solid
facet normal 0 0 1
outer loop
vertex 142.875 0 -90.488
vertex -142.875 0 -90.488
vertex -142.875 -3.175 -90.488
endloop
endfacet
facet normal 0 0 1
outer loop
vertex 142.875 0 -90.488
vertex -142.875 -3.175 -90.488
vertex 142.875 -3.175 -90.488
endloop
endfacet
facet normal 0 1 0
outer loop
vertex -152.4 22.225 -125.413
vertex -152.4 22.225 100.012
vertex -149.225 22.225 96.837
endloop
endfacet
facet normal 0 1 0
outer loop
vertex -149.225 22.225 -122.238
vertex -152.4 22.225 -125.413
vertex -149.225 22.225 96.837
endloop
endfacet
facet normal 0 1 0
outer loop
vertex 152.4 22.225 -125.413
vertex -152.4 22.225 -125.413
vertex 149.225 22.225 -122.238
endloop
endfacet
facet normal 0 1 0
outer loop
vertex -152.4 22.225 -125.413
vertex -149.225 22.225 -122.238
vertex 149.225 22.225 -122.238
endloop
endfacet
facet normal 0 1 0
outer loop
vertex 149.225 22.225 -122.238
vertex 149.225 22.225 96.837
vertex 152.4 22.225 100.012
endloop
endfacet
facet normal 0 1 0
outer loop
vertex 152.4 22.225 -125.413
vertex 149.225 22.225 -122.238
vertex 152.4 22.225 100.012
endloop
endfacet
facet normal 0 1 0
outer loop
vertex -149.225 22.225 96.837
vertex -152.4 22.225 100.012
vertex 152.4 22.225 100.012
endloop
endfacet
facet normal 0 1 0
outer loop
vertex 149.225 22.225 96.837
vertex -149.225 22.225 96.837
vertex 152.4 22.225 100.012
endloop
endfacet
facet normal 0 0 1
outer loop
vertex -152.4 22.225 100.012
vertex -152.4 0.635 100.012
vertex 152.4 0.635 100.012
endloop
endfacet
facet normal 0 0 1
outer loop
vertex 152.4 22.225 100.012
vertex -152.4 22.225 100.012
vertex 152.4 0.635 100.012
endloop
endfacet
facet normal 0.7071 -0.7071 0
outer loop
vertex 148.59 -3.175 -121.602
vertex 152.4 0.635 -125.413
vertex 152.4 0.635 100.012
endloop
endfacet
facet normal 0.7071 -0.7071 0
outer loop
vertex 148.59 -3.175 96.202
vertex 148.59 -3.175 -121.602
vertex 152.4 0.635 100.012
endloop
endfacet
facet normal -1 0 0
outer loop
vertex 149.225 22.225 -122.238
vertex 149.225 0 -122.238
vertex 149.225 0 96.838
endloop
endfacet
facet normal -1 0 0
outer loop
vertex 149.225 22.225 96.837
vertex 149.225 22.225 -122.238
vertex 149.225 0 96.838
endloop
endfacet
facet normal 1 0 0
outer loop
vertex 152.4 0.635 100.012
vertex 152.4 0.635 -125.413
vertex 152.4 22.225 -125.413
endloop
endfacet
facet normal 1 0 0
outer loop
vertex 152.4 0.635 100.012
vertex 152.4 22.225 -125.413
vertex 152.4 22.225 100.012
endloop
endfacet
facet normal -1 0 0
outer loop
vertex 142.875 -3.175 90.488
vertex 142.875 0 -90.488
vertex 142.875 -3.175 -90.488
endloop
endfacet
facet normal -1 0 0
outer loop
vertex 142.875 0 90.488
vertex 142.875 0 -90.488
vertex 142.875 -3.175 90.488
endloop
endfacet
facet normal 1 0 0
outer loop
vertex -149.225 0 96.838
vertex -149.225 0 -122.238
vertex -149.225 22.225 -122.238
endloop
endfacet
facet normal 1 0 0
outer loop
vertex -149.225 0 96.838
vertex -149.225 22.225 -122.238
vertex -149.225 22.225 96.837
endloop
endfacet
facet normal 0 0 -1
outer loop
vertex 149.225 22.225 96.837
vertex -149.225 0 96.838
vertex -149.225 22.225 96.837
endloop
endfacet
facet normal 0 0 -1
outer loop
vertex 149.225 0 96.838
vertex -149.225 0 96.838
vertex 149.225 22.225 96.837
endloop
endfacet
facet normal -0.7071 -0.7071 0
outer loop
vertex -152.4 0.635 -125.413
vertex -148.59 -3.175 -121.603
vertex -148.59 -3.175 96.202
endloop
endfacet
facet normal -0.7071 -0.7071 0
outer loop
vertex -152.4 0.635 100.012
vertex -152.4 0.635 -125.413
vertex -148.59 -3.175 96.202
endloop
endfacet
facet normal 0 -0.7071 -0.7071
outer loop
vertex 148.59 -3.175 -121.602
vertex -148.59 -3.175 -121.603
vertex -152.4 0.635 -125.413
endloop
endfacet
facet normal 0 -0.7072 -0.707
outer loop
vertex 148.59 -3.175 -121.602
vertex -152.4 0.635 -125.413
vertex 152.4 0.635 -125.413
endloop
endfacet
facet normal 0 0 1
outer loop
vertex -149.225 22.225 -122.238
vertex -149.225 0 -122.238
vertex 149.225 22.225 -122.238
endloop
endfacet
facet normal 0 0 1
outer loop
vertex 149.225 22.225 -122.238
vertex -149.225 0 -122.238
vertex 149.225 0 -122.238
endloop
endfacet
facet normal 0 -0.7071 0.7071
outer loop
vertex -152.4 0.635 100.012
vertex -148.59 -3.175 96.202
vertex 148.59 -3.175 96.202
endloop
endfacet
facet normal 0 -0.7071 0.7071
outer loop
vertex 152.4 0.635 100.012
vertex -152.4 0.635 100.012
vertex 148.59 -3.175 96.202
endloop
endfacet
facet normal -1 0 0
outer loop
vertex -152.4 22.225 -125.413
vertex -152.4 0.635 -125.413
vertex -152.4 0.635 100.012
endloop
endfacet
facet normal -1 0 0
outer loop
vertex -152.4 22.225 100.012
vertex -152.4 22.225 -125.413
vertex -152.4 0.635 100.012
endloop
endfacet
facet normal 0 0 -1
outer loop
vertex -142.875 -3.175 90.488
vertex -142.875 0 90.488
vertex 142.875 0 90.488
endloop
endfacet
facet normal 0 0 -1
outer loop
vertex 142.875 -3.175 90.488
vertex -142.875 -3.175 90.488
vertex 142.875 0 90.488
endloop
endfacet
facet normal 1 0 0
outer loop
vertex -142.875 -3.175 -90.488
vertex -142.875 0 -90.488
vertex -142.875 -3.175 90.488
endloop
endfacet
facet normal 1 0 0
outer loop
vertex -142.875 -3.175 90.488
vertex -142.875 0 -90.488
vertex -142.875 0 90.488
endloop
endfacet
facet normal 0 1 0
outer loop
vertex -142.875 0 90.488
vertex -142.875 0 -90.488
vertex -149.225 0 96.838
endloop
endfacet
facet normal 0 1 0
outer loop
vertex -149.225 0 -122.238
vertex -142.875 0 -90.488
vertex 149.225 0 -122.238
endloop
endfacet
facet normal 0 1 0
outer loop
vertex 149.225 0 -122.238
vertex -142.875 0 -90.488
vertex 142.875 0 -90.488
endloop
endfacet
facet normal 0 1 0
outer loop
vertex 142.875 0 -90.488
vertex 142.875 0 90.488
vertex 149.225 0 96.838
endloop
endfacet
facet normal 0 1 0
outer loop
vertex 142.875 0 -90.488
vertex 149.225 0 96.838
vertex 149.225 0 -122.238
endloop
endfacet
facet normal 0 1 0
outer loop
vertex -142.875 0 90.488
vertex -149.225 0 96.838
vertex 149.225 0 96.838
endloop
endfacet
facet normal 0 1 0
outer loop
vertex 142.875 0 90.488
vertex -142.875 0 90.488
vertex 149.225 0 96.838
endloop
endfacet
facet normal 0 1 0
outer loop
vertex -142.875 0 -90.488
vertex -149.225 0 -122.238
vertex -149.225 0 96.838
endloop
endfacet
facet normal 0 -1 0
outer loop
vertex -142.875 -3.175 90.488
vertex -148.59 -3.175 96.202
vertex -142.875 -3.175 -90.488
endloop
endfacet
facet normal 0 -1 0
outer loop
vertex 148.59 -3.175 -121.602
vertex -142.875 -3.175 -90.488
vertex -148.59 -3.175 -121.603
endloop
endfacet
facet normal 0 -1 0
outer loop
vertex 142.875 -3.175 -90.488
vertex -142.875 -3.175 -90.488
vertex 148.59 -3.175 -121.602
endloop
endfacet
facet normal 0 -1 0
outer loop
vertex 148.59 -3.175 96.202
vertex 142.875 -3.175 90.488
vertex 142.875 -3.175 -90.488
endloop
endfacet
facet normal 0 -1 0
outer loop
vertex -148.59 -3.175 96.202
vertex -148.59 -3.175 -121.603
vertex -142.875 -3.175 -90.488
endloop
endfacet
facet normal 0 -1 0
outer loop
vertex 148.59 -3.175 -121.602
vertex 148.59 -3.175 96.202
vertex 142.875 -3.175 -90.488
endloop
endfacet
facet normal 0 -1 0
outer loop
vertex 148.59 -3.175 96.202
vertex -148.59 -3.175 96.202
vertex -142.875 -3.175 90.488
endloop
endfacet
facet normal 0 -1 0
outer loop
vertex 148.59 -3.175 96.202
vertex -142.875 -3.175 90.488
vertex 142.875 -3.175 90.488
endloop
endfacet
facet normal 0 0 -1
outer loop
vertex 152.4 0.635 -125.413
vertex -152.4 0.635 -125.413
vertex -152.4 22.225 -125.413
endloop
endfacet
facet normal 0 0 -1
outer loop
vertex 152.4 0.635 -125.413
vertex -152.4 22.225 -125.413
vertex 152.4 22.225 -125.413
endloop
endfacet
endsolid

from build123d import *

# Parameters (mm, degrees)
F0_W     = 298.45
F0_H     = 25.4
F0_H_2   = 193.675
F0_W_2   = 285.75
F0_H_3   = 180.975
F1_DEPTH = 3.175
F2_W     = 304.8
F2_H     = 225.425
F2_W_2   = 298.45
F2_H_2   = 219.075
F3_DEPTH = 25.4
F4_SIZE  = 3.81


with BuildPart() as f1:
    # F0 (on Front) → F1 (new body)
    with BuildSketch(Plane.XZ):
        with Locations((0, -109.5375)):
            Rectangle(F0_W, F0_H)
        Rectangle(F0_W, F0_H_2)
        Rectangle(F0_W_2, F0_H_3, mode=Mode.SUBTRACT)
    extrude(amount=F1_DEPTH)

    # F2 (on face) → F3 (join)
    with BuildSketch(Plane.XZ.offset(3.175)):
        with Locations((0, -12.7)):
            Rectangle(F2_W, F2_H)
        with Locations((0, -12.7)):
            Rectangle(F2_W_2, F2_H_2, mode=Mode.SUBTRACT)
    extrude(amount=-F3_DEPTH)

    # F4
    f4_edges = [f1.edges().sort_by_distance(p)[0] for p in [
        (-152.4, -3.175, -12.7),
        (0, -3.175, -125.4125),
        (152.4, -3.175, -12.7),
        (0, -3.175, 100.0125),
    ]]
    chamfer(f4_edges, length=F4_SIZE)


solid = f1.part
